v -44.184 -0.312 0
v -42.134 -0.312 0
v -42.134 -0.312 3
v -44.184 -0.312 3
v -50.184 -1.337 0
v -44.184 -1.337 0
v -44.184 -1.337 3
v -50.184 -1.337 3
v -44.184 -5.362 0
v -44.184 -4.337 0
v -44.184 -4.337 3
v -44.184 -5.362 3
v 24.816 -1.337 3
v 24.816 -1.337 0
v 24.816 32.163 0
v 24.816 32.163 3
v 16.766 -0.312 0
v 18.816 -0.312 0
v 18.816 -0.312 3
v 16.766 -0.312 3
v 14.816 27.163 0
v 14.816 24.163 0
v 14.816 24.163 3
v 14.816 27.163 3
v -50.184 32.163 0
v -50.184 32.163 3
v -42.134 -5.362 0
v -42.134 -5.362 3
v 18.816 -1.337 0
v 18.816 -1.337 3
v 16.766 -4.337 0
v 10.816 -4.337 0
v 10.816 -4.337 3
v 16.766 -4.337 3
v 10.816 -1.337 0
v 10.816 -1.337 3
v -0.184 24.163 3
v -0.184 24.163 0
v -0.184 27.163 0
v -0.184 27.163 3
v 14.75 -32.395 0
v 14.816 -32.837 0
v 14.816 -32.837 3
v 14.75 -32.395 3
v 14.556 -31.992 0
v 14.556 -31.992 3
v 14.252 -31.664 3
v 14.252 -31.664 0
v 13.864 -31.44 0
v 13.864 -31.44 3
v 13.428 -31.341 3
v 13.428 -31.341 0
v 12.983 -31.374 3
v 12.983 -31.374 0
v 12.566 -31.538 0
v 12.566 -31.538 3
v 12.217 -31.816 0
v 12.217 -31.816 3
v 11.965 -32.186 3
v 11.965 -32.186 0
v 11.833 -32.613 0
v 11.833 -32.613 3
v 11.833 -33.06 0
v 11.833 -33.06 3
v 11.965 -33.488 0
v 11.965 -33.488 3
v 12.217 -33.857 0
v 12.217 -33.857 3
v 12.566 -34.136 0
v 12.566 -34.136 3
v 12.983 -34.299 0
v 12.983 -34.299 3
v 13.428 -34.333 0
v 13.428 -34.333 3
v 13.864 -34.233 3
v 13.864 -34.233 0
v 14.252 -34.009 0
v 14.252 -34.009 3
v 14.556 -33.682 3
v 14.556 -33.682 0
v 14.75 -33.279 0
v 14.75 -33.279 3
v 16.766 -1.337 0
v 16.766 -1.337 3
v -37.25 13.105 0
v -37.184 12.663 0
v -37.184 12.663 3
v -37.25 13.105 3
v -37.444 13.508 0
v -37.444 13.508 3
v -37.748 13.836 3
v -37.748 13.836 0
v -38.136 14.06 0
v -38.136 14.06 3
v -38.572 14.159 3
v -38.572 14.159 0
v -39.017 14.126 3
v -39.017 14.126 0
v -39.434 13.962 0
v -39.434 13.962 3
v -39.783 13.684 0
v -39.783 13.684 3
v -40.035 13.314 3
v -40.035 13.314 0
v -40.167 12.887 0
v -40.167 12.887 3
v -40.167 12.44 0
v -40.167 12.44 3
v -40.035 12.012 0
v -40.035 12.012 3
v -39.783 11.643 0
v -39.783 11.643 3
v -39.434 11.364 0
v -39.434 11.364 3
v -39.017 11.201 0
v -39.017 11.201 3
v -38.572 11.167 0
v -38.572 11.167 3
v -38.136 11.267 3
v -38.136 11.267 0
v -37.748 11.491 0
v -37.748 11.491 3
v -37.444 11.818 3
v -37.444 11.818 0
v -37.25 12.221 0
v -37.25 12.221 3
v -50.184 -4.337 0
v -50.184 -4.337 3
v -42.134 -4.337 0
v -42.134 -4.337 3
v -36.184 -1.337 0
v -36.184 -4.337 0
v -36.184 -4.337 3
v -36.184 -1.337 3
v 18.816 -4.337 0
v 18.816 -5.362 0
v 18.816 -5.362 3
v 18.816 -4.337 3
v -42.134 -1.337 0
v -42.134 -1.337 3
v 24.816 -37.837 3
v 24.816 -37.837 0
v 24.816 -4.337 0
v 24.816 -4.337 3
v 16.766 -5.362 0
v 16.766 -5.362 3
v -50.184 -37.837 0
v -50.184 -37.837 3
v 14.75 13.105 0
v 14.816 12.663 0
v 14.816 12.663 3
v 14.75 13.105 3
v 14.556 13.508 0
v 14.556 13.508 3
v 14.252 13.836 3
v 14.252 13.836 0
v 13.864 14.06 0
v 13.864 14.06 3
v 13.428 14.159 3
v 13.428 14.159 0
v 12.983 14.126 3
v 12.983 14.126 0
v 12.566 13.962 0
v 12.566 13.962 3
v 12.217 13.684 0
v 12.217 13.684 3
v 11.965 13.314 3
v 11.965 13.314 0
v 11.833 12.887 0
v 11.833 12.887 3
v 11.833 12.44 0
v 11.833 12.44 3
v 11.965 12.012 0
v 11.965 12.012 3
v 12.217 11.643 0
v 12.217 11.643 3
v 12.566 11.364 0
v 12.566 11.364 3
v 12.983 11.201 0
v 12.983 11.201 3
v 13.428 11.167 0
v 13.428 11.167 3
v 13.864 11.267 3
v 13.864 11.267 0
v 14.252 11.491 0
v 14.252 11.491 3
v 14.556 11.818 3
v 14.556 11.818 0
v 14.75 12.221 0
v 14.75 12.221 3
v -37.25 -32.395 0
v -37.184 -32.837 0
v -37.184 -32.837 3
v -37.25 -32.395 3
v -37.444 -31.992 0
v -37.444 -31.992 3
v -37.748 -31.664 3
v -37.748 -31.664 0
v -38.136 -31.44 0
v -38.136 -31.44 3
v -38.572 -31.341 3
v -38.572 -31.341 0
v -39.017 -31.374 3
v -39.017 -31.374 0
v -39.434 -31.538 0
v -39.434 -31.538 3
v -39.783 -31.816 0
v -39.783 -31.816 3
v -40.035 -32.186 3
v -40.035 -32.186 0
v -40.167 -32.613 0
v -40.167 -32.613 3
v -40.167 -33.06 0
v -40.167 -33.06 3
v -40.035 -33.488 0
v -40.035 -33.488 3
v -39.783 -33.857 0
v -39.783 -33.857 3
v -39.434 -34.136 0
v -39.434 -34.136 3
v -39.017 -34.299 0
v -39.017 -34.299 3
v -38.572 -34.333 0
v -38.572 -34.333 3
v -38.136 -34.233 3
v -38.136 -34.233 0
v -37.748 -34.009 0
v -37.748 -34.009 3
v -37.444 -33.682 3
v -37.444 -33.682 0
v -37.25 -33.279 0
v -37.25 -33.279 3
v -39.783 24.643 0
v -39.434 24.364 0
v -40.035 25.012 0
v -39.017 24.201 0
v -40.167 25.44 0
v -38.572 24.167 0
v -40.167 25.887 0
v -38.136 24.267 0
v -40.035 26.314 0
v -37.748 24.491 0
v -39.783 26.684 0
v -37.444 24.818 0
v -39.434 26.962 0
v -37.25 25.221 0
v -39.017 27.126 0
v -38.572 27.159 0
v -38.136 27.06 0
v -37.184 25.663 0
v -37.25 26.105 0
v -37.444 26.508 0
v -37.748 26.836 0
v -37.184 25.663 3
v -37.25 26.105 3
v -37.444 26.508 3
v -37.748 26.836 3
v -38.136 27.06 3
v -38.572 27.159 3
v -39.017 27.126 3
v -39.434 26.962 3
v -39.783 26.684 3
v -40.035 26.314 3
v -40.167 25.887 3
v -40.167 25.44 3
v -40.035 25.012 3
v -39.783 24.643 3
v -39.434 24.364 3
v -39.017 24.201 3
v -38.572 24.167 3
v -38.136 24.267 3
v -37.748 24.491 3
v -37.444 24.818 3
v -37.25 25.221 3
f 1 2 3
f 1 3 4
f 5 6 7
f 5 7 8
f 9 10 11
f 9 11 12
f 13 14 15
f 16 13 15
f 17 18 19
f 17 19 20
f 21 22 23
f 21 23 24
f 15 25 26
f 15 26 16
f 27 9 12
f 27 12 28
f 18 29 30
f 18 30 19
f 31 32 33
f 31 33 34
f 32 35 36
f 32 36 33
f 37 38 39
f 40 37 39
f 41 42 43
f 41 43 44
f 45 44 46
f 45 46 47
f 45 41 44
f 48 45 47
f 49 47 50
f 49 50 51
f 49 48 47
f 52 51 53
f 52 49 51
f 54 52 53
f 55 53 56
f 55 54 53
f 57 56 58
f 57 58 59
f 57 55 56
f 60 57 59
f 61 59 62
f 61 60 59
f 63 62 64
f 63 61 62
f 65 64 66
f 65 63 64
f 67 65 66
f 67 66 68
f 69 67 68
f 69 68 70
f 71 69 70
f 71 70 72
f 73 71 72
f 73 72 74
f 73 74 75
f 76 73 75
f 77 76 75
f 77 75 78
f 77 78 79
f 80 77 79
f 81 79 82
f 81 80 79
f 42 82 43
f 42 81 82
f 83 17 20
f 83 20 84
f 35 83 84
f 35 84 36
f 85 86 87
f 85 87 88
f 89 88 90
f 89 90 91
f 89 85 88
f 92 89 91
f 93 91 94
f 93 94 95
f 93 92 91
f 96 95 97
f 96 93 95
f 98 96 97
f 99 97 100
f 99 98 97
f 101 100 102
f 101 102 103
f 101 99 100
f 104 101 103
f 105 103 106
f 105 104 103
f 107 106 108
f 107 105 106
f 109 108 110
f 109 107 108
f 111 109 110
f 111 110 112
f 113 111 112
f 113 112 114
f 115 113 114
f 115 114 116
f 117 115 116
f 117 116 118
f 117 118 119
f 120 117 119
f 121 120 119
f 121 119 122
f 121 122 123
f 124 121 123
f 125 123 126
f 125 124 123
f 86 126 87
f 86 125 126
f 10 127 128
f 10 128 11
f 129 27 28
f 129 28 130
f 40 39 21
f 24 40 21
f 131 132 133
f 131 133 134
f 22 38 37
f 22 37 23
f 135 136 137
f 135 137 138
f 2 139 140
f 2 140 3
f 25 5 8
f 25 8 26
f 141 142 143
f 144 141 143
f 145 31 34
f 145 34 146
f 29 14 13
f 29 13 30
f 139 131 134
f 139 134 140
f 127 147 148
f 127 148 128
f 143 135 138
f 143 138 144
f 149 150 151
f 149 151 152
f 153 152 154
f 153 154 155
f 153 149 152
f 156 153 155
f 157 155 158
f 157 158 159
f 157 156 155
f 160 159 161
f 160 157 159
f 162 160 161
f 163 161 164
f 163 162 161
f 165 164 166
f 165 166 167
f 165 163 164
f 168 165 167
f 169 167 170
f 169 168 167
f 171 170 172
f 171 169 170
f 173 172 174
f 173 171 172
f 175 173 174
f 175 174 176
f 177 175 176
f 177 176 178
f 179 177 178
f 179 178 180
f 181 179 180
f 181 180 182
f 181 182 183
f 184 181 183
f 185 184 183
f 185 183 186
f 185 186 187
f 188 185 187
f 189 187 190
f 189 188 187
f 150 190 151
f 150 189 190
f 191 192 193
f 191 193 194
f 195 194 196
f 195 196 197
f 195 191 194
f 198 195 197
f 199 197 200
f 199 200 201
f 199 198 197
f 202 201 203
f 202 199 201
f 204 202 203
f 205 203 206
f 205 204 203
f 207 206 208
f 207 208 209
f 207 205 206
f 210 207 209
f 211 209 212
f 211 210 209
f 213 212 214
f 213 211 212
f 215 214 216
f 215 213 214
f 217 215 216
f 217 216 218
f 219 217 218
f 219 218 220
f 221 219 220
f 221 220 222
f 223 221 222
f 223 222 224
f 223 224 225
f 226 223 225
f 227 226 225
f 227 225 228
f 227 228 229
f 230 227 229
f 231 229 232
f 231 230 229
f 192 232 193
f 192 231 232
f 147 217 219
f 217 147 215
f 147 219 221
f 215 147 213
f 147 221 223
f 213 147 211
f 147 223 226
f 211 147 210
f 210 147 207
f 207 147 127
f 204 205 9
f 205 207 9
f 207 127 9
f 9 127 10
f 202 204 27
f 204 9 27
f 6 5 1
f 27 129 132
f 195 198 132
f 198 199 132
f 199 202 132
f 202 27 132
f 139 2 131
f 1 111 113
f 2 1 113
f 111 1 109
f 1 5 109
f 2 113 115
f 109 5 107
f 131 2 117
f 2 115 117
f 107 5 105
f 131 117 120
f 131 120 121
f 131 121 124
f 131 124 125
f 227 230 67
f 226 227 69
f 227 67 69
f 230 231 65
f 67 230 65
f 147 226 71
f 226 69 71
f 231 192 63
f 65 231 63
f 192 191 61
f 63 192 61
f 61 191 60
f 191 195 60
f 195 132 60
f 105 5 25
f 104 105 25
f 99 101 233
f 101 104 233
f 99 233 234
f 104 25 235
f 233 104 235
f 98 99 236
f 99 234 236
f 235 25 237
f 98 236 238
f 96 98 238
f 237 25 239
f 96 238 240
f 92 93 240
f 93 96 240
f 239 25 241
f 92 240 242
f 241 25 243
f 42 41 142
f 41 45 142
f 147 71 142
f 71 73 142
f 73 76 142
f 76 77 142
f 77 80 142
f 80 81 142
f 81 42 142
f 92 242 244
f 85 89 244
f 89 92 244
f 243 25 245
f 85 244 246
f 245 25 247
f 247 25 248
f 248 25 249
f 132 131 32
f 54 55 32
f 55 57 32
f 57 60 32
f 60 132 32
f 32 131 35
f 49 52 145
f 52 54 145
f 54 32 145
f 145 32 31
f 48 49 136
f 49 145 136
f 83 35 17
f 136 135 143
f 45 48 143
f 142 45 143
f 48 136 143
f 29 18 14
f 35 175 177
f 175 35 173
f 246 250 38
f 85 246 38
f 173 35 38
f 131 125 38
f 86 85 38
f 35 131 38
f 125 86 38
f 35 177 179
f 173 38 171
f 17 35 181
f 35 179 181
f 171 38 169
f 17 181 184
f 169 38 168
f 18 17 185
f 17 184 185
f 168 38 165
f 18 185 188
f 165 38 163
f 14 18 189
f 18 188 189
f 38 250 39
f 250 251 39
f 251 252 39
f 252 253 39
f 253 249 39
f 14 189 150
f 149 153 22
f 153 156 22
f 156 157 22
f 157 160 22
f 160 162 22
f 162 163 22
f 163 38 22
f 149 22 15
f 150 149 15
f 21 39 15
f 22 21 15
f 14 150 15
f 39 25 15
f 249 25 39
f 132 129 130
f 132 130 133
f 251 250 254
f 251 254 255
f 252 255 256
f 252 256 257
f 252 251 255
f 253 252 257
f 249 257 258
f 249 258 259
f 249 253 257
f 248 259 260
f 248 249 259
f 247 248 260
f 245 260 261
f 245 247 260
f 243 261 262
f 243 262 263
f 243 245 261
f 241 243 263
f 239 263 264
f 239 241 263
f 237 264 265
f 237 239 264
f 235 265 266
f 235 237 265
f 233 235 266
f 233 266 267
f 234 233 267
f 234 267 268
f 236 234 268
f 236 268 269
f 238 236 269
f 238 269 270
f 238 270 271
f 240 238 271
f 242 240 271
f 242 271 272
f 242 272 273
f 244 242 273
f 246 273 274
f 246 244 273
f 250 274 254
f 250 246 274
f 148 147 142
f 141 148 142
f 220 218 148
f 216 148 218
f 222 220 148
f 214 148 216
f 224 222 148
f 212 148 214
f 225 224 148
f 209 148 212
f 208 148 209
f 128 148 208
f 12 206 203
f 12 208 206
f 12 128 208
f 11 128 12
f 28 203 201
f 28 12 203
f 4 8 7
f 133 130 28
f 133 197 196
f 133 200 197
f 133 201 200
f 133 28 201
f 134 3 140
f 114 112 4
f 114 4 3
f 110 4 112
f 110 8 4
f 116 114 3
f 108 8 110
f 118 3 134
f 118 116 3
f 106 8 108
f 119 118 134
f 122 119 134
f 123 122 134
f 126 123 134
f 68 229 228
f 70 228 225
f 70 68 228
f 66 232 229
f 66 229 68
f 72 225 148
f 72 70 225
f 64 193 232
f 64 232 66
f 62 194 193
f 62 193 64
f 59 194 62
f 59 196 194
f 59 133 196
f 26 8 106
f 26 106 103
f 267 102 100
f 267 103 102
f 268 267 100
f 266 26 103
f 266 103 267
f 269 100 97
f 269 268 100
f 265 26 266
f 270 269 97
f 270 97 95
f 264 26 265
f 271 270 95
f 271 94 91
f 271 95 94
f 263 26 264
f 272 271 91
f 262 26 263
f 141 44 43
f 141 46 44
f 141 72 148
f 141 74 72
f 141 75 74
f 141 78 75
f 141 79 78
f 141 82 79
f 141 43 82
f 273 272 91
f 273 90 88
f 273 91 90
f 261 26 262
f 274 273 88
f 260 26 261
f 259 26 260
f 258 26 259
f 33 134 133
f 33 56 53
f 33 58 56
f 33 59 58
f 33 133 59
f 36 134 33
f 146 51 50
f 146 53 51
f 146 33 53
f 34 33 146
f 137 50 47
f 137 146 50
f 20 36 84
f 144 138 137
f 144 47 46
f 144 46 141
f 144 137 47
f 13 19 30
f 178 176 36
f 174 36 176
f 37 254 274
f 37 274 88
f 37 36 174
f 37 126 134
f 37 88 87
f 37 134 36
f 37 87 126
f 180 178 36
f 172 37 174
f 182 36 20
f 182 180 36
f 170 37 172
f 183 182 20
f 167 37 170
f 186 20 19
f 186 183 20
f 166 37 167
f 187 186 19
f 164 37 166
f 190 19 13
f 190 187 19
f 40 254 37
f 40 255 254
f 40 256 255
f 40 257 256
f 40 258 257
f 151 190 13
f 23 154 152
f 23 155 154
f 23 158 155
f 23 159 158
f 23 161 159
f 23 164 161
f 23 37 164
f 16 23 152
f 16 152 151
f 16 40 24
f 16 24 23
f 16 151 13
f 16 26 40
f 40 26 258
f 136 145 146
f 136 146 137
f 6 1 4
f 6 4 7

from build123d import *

# Parameters (mm, degrees)
ESQUISSE1_W                  = 75
ESQUISSE1_H                  = 70
ESQUISSE1_R                  = 1.5
ESQUISSE1_W_2                = 15
ESQUISSE1_H_2                = 3
BOSS_EXTRU_1_DEPTH           = 3
ENL_V_MAT_EXTRU_2_DEPTH      = 10
ENL_V_MAT_EXTRU_2_DEPTH_BACK = 10


with BuildPart() as part:
    # Esquisse1 → Boss.-Extru.1 (new body)
    with BuildSketch(Plane.XY):
        with Locations((-12.683673469, -2.836734694)):
            Rectangle(ESQUISSE1_W, ESQUISSE1_H)
        with Locations((-38.683673469, 25.663265306)):
            Circle(ESQUISSE1_R, mode=Mode.SUBTRACT)
        with Locations((-38.683673469, 12.663265306)):
            Circle(ESQUISSE1_R, mode=Mode.SUBTRACT)
        with Locations((13.316326531, 12.663265306)):
            Circle(ESQUISSE1_R, mode=Mode.SUBTRACT)
        with Locations((-38.683673469, -32.836734694)):
            Circle(ESQUISSE1_R, mode=Mode.SUBTRACT)
        with Locations((13.316326531, -32.836734694)):
            Circle(ESQUISSE1_R, mode=Mode.SUBTRACT)
        with Locations((7.316326531, 25.663265306)):
            Rectangle(ESQUISSE1_W_2, ESQUISSE1_H_2, mode=Mode.SUBTRACT)
    extrude(amount=BOSS_EXTRU_1_DEPTH)

    # Esquisse2 → Enlèv. mat.-Extru.2 (cut, two sides: drawn at the far end of the back side and taken through both)
    with BuildSketch(Plane.XY.offset(-ENL_V_MAT_EXTRU_2_DEPTH_BACK)):
        Polygon((24.816326531, -1.336734694), (18.816326531, -1.336734694), (18.816326531, -0.311734694), (16.766326531, -0.311734694), (16.766326531, -1.336734694), (10.816326531, -1.336734694), (10.816326531, -4.336734694), (16.766326531, -4.336734694), (16.766326531, -5.361734694), (18.816326531, -5.361734694), (18.816326531, -4.336734694), (24.816326531, -4.336734694), align=None)
        Polygon((-50.183673469, -1.336734694), (-50.183673469, -4.336734694), (-44.183673469, -4.336734694), (-44.183673469, -5.361734694), (-42.133673469, -5.361734694), (-42.133673469, -4.336734694), (-36.183673469, -4.336734694), (-36.183673469, -1.336734694), (-42.133673469, -1.336734694), (-42.133673469, -0.311734694), (-44.183673469, -0.311734694), (-44.183673469, -1.336734694), align=None)
    extrude(amount=ENL_V_MAT_EXTRU_2_DEPTH + ENL_V_MAT_EXTRU_2_DEPTH_BACK, mode=Mode.SUBTRACT)


solid = part.part
